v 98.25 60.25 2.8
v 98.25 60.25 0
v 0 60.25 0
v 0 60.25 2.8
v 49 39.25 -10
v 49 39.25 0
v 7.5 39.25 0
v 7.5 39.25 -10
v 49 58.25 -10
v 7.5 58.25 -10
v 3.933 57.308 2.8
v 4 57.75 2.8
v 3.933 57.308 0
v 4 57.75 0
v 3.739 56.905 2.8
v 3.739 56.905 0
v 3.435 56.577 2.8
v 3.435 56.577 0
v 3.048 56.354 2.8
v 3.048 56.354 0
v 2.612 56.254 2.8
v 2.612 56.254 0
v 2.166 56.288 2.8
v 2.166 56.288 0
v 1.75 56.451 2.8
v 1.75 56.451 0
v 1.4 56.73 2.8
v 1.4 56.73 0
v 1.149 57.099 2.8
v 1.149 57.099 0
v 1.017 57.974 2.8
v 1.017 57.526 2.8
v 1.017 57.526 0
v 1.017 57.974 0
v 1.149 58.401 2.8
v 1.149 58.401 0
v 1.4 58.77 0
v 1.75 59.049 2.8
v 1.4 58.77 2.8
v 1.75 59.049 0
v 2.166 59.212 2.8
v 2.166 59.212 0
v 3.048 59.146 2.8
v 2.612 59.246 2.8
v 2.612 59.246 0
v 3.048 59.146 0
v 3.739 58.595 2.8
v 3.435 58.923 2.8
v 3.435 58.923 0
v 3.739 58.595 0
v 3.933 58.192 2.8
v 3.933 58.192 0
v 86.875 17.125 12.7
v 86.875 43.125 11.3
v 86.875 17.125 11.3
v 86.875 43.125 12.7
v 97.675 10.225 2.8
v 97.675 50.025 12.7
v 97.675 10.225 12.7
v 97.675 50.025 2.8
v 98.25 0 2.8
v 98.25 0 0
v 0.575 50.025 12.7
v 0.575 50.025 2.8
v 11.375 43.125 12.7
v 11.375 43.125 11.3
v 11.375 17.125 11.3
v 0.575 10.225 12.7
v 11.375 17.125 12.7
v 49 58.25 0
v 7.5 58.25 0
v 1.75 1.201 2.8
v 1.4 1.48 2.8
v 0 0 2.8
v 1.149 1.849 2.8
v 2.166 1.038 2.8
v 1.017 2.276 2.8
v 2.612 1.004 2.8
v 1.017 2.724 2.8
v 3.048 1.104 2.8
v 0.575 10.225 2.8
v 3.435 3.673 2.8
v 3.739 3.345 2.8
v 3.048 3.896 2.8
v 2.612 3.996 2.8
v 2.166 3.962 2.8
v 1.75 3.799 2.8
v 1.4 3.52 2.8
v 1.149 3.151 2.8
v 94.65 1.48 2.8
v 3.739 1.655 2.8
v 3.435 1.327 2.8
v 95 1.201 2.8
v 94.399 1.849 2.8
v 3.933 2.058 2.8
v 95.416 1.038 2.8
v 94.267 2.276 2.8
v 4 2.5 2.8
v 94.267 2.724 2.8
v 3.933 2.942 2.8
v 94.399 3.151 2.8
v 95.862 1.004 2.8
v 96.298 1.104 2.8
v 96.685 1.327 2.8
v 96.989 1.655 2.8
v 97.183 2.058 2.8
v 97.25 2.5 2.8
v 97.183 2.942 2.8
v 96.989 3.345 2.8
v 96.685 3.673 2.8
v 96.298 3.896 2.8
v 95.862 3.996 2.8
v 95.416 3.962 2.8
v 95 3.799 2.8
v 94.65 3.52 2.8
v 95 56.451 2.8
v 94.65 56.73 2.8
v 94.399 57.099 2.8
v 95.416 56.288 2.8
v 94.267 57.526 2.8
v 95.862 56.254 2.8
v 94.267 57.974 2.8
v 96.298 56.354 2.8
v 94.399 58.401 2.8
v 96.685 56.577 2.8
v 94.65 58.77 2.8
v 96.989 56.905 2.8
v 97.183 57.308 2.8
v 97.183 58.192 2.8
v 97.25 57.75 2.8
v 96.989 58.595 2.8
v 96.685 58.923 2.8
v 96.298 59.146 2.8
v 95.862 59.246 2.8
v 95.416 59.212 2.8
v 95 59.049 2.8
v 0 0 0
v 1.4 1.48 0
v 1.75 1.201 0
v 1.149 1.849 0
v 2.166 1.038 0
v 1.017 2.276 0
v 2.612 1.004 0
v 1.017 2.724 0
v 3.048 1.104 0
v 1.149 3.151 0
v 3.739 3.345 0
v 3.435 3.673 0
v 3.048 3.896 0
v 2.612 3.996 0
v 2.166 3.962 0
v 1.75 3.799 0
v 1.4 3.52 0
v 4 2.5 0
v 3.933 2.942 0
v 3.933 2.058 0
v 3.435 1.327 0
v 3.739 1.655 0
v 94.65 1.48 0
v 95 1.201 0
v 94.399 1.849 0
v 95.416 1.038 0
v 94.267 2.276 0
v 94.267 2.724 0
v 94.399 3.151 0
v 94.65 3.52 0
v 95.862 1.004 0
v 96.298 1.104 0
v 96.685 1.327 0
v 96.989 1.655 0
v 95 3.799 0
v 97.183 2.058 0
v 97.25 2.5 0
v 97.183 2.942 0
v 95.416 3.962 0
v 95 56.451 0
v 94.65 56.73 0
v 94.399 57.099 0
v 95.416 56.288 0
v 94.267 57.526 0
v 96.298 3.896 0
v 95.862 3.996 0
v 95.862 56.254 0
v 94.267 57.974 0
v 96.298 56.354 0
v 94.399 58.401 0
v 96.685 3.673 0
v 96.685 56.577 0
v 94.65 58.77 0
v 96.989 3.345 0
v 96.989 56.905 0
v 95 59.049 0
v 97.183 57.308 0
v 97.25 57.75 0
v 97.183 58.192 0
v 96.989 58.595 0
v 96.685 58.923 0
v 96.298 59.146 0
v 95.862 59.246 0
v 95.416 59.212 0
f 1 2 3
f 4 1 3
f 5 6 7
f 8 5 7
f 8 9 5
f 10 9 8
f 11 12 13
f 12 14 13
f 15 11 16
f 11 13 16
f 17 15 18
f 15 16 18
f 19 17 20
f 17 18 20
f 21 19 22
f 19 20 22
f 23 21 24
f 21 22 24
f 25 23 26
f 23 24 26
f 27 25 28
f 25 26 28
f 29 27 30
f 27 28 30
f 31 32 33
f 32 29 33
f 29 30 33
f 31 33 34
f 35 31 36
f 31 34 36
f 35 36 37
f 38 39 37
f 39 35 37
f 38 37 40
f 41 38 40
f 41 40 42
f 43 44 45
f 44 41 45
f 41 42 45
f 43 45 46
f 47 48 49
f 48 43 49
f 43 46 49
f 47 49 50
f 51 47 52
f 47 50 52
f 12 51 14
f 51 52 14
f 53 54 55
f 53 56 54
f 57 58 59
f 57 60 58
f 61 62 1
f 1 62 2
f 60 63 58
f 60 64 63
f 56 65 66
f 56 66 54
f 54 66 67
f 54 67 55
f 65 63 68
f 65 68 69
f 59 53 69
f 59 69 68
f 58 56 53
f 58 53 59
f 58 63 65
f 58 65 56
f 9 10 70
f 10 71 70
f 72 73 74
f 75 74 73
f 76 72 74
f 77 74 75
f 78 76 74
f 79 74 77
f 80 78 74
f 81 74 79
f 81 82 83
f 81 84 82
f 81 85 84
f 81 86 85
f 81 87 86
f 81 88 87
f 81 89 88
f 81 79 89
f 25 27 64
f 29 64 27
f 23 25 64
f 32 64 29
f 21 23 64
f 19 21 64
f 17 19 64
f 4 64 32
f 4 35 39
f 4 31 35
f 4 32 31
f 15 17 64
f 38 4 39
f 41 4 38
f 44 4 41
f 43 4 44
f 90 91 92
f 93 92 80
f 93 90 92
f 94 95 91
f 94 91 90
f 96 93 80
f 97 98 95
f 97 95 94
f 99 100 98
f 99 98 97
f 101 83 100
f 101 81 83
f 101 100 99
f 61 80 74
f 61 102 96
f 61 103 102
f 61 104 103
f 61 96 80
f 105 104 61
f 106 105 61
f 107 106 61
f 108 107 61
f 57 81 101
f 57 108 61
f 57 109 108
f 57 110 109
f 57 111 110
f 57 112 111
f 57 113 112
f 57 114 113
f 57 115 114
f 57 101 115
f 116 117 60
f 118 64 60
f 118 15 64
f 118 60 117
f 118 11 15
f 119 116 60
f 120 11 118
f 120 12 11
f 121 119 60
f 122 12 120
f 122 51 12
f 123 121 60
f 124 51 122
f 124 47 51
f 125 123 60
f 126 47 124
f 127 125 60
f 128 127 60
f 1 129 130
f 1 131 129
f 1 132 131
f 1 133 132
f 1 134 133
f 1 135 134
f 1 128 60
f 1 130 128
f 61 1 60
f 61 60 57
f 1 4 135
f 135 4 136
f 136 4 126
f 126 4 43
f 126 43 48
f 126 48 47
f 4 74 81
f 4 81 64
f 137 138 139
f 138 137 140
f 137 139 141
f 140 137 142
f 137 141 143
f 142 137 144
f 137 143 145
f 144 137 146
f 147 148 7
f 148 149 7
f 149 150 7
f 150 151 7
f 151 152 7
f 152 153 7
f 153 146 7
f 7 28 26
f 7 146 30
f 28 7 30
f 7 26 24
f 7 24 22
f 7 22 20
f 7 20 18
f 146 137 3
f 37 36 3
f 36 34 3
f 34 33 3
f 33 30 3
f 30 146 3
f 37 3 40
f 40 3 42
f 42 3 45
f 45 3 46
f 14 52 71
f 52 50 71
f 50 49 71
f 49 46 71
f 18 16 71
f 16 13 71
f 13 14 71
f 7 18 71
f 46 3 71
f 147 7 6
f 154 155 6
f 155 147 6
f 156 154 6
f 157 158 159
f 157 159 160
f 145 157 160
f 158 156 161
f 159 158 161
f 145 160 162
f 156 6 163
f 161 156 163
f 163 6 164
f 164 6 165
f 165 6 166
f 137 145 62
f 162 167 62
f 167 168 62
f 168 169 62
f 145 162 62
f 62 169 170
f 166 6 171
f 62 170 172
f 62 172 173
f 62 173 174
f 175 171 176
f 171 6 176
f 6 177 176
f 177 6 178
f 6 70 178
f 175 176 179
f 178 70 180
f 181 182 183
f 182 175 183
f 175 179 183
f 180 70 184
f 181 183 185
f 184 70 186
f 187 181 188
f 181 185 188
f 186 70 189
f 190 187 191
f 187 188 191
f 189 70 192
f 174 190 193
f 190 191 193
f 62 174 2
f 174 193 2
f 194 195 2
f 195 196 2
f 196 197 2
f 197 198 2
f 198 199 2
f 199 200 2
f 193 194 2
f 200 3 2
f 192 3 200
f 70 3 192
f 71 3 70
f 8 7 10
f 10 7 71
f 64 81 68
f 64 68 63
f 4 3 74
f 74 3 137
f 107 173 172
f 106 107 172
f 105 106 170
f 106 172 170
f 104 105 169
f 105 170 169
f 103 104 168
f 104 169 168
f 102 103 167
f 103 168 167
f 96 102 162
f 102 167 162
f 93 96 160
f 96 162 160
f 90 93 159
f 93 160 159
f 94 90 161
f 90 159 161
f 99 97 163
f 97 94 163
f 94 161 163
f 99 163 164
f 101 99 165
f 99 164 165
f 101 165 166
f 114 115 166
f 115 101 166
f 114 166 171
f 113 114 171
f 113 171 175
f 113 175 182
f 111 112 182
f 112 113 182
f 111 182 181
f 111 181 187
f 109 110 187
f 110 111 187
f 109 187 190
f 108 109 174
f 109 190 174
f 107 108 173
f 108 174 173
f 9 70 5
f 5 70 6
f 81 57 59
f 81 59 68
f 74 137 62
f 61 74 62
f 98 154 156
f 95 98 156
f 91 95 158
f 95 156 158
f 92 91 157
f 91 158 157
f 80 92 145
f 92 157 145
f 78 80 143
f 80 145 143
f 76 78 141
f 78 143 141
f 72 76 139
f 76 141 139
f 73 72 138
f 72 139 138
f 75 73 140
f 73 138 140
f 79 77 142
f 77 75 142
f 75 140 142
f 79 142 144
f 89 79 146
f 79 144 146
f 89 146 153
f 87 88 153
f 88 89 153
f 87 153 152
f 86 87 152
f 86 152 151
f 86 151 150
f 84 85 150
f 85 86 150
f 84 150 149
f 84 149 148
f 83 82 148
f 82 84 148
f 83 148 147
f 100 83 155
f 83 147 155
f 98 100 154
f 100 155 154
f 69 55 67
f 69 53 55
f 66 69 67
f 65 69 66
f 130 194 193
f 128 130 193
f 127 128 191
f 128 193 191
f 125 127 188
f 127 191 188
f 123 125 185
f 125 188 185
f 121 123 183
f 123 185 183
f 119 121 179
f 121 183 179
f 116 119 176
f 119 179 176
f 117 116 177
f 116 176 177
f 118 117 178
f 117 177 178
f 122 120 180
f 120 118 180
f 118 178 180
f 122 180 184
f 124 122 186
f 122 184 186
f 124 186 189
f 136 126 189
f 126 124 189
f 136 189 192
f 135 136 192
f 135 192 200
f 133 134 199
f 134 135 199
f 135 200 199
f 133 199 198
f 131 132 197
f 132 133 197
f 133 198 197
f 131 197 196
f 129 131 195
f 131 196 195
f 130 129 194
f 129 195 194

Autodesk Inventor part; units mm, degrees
ref_plane "YZ Plane" through (0, 0, 0) normal (1, 0, 0) x (0, 1, 0)
ref_plane "XZ Plane" through (0, 0, 0) normal (0, 1, 0) x (-1, 0, 0)
ref_plane "XY Plane" through (0, 0, 0) normal (0, 0, 1) x (1, 0, 0)
sketch "Sketch1" plane through (0, 0, 0) normal (0, 0, 1) x (1, 0, 0)
  line L0 (0, 0) -> (98.25, 0)
  line L1 (98.25, 0) -> (98.25, 60.25)
  line L2 (98.25, 60.25) -> (0, 60.25)
  line L3 (0, 60.25) -> (0, 0)
  line L4 (0, 60.25) -> (2.5, 60.25) construction
  line L5 (2.5, 60.25) -> (2.5, 57.75) construction
  line L6 (2.5, 57.75) -> (0, 57.75) construction
  line L7 (0, 57.75) -> (0, 60.25) construction
  circle A0 centre (2.5, 57.75) radius 1.5
  line L8 (49.125, 60.25) -> (49.125, 0) construction
  line L9 (0, 30.125) -> (98.25, 30.125) construction
  circle A1 centre (95.75, 57.75) radius 1.5
  circle A2 centre (2.5, 2.5) radius 1.5
  circle A3 centre (95.75, 2.5) radius 1.5
  dimension "d0" = 98.25
  dimension "d1" = 60.25
  dimension "d2" = 2.5
  dimension "d7" = 2.5
  dimension "d8" = 3
extrude "LcdPcb" add sketch "Sketch1" along normal blind 2.8
sketch "Sketch2" plane through (0, 0, 2.8) normal (0, 0, 1) x (1, 0, 0)
  line L0 (98.25, 60.25) -> (0, 60.25) construction
  line L1 (49.125, 60.25) -> (49.125, 0) construction
  line L2 (0, 0) -> (98.25, 0) construction
  line L3 (0, 60.25) -> (0, 0) construction
  line L4 (0, 30.125) -> (98.25, 30.125) construction
  line L5 (98.25, 0) -> (98.25, 60.25) construction
  line L6 (0.575, 50.025) -> (97.675, 50.025)
  line L7 (97.675, 50.025) -> (97.675, 10.225)
  line L8 (97.675, 10.225) -> (0.575, 10.225)
  line L9 (0.575, 10.225) -> (0.575, 50.025)
  line L10 (0.575, 50.025) -> (97.675, 10.225) construction
  line L11 (97.675, 50.025) -> (0.575, 10.225) construction
  point P0 (49.125, 30.125)
  dimension "d15" = 39.8
  dimension "d16" = 97.1
extrude "LcdBezel" add sketch "Sketch2" along normal blind 9.9
sketch "Sketch3" plane through (0, 0, 12.7) normal (0, 0, 1) x (1, 0, 0)
  line L0 (0.575, 50.025) -> (0.575, 10.225) construction
  line L1 (0.575, 50.025) -> (11.375, 50.025) construction
  line L2 (11.375, 50.025) -> (11.375, 43.125) construction
  line L3 (11.375, 43.125) -> (0.575, 43.125) construction
  line L4 (0.575, 43.125) -> (0.575, 50.025) construction
  line L5 (11.375, 43.125) -> (86.875, 43.125)
  line L6 (86.875, 43.125) -> (86.875, 17.125)
  line L7 (86.875, 17.125) -> (11.375, 17.125)
  line L8 (11.375, 17.125) -> (11.375, 43.125)
  point P0 (0, 0)
  dimension "LcdBezelHeight" = 6.9
  dimension "LcdBezelLength" = 10.8
  dimension "d28" = 75.5
  dimension "d29" = 26
extrude "Lcd" cut sketch "Sketch3" against normal blind 1.4
sketch "Sketch4" plane through (0, 0, 0) normal (0, 0, -1) x (-1, 0, 0)
  line L0 (0, 60.25) -> (0, 0) construction
  line L1 (0, 60.25) -> (-7.5, 60.25) construction
  line L2 (-7.5, 60.25) -> (-7.5, 58.25) construction
  line L3 (-7.5, 58.25) -> (0, 58.25) construction
  line L4 (0, 58.25) -> (0, 60.25) construction
  line L5 (-7.5, 58.25) -> (-49, 58.25)
  line L6 (-49, 58.25) -> (-49, 39.25)
  line L7 (-49, 39.25) -> (-7.5, 39.25)
  line L8 (-7.5, 39.25) -> (-7.5, 58.25)
  dimension "LcdRearKeepOutHeightOffset" = 2
  dimension "LcdRearKeepOutLengthOffset" = 7.5
  dimension "LcdRearKeepOutHeight" = 19
  dimension "LcdRearKeepOutLength" = 41.5
extrude "LcdRearKeepOut" add sketch "Sketch4" along normal blind 10
equation "\"d0\" = LcdBorderLength"
equation "\"d1\" = LcdBorderHeight"
equation "\"d2\" = LcdFrameHoleOffset"
equation "\"d7\" = LcdFrameHoleOffset"
equation "\"d8\" = LcdFrameHoleDiameter"
equation "\"d12\" = LcdPcbThickness"
equation "\"d15\" = LcdHeight"
equation "\"d16\" = LcdLength"
equation "\"d28\" = LcdLength - 2 * LcdBezelLength"
equation "\"d29\" = LcdHeight - 2 * LcdBezelHeight"
equation "\"d30\" = 0.5 * LcdPcbThickness"
properties part number "LcdAssembly"
